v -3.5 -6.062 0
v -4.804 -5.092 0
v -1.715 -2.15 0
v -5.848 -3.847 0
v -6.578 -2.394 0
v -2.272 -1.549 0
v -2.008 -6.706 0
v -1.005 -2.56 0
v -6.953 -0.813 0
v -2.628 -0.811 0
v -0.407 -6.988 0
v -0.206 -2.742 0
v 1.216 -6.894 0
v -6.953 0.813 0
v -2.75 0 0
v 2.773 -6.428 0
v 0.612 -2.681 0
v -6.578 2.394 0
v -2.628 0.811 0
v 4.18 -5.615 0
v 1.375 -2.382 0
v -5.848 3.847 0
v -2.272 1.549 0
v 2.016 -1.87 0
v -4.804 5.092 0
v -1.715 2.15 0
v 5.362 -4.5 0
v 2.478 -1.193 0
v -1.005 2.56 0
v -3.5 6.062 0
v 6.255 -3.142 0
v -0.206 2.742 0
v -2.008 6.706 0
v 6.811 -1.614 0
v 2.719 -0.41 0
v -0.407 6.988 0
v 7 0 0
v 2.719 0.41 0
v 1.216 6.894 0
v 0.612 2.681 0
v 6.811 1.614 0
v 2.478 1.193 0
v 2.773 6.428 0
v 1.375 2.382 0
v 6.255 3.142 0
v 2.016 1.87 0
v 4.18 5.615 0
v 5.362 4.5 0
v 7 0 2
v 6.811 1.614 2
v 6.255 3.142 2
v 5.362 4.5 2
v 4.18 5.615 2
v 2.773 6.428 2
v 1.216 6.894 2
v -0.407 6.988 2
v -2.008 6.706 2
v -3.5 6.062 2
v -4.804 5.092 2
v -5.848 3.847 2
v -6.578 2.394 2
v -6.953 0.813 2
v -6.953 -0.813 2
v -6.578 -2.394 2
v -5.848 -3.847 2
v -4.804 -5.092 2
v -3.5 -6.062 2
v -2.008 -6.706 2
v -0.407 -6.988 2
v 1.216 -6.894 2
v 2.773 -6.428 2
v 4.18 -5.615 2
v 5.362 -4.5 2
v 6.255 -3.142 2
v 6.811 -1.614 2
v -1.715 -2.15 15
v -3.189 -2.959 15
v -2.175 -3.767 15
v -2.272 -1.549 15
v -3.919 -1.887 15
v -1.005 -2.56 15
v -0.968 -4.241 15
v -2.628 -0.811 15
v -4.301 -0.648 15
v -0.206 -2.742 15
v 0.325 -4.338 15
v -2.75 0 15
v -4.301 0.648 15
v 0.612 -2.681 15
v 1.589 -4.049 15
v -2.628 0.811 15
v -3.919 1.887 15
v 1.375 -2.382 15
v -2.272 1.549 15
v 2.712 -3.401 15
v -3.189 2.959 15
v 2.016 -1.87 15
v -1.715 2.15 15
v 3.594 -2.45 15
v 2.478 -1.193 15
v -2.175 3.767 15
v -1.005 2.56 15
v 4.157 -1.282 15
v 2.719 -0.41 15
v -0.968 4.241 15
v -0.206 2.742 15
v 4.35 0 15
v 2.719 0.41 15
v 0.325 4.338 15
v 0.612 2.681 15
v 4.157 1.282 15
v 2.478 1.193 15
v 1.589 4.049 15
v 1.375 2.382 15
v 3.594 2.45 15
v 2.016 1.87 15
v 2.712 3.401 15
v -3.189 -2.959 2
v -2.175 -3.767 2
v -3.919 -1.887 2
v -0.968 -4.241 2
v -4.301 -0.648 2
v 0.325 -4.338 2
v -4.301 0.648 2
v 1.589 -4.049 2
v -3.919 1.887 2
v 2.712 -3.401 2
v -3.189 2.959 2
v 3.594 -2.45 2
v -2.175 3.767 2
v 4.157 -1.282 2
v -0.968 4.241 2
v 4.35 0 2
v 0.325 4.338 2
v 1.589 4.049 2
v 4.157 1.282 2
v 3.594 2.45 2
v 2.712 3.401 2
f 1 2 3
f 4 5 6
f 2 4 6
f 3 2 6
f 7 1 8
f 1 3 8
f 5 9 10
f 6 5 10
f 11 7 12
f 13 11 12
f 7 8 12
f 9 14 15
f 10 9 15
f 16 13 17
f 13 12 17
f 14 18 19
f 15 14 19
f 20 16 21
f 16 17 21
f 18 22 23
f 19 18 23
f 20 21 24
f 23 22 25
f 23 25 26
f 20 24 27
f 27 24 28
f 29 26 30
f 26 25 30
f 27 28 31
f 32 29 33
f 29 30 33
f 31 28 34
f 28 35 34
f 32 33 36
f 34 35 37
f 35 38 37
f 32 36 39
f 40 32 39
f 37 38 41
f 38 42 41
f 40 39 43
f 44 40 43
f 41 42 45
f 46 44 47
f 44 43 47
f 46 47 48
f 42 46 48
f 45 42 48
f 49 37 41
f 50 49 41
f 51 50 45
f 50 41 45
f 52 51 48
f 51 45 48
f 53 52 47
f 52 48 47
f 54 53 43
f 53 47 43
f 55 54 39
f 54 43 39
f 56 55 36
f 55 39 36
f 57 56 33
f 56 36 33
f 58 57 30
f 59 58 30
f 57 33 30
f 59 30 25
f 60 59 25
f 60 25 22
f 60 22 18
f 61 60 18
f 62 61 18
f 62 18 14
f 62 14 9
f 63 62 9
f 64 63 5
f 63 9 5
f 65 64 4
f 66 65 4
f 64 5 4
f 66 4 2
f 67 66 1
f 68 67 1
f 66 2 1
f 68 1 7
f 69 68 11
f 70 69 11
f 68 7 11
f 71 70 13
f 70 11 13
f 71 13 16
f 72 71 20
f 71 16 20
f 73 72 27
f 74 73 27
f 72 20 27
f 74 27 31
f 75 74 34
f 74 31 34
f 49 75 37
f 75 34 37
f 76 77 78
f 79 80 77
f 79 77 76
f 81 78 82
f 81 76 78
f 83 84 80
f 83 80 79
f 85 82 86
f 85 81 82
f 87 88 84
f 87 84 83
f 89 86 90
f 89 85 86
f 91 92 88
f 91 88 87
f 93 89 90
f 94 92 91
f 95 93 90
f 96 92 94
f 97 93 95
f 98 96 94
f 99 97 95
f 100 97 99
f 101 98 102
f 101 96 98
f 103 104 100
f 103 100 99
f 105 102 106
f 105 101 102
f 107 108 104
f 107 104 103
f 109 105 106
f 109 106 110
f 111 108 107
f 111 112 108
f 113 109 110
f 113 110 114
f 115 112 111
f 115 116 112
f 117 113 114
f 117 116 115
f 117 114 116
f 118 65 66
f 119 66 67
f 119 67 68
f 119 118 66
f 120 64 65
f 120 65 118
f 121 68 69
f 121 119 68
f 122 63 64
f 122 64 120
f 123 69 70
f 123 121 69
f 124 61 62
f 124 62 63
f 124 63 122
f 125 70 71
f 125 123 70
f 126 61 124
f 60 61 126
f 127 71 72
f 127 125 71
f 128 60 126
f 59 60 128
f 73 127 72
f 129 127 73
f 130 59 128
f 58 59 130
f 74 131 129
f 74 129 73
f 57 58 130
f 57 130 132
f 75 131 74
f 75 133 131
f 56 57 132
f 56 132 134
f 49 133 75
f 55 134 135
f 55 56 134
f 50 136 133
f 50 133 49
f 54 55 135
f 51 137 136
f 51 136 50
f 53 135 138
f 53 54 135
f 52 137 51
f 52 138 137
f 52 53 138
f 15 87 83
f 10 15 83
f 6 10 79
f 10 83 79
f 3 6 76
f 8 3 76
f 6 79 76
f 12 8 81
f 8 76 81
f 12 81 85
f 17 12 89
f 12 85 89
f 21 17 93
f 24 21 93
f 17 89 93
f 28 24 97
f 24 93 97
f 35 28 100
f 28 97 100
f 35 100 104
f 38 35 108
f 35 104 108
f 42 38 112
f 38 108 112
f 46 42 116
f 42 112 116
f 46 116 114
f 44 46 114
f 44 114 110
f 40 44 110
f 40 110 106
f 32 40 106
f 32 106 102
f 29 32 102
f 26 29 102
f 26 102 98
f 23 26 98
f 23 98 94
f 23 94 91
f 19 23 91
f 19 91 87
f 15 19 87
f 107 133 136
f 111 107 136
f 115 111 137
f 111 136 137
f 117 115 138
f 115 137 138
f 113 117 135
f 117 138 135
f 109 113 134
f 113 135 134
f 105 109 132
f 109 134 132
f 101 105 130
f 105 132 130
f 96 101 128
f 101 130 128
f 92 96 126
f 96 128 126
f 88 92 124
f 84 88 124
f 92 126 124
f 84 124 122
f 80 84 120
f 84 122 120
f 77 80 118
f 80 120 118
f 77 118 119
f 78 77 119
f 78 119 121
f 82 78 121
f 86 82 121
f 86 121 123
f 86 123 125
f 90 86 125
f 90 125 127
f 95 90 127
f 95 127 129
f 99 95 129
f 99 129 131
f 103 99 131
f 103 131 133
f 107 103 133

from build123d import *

# Parameters (mm, degrees)
F0_R     = 4.35
F1_DEPTH = 15
F0_R_2   = 7
F2_DEPTH = 2
F3_D     = 5.5


with BuildPart() as f1:
    # F0 (on Top) → F1 (new body)
    with BuildSketch(Plane.XY):
        Circle(F0_R)
    extrude(amount=F1_DEPTH)

    # F0 (on Top) → F2 (join)
    with BuildSketch(Plane.XY):
        Circle(F0_R_2)
        Circle(F0_R, mode=Mode.SUBTRACT)
    extrude(amount=F2_DEPTH)

    # F3 (through all)
    with Locations(Plane(origin=(0, 0, 0), x_dir=(1, 0, 0), z_dir=(0, 0, -1))):
        with Locations((0, 0)):
            Hole(F3_D / 2)


solid = f1.part
